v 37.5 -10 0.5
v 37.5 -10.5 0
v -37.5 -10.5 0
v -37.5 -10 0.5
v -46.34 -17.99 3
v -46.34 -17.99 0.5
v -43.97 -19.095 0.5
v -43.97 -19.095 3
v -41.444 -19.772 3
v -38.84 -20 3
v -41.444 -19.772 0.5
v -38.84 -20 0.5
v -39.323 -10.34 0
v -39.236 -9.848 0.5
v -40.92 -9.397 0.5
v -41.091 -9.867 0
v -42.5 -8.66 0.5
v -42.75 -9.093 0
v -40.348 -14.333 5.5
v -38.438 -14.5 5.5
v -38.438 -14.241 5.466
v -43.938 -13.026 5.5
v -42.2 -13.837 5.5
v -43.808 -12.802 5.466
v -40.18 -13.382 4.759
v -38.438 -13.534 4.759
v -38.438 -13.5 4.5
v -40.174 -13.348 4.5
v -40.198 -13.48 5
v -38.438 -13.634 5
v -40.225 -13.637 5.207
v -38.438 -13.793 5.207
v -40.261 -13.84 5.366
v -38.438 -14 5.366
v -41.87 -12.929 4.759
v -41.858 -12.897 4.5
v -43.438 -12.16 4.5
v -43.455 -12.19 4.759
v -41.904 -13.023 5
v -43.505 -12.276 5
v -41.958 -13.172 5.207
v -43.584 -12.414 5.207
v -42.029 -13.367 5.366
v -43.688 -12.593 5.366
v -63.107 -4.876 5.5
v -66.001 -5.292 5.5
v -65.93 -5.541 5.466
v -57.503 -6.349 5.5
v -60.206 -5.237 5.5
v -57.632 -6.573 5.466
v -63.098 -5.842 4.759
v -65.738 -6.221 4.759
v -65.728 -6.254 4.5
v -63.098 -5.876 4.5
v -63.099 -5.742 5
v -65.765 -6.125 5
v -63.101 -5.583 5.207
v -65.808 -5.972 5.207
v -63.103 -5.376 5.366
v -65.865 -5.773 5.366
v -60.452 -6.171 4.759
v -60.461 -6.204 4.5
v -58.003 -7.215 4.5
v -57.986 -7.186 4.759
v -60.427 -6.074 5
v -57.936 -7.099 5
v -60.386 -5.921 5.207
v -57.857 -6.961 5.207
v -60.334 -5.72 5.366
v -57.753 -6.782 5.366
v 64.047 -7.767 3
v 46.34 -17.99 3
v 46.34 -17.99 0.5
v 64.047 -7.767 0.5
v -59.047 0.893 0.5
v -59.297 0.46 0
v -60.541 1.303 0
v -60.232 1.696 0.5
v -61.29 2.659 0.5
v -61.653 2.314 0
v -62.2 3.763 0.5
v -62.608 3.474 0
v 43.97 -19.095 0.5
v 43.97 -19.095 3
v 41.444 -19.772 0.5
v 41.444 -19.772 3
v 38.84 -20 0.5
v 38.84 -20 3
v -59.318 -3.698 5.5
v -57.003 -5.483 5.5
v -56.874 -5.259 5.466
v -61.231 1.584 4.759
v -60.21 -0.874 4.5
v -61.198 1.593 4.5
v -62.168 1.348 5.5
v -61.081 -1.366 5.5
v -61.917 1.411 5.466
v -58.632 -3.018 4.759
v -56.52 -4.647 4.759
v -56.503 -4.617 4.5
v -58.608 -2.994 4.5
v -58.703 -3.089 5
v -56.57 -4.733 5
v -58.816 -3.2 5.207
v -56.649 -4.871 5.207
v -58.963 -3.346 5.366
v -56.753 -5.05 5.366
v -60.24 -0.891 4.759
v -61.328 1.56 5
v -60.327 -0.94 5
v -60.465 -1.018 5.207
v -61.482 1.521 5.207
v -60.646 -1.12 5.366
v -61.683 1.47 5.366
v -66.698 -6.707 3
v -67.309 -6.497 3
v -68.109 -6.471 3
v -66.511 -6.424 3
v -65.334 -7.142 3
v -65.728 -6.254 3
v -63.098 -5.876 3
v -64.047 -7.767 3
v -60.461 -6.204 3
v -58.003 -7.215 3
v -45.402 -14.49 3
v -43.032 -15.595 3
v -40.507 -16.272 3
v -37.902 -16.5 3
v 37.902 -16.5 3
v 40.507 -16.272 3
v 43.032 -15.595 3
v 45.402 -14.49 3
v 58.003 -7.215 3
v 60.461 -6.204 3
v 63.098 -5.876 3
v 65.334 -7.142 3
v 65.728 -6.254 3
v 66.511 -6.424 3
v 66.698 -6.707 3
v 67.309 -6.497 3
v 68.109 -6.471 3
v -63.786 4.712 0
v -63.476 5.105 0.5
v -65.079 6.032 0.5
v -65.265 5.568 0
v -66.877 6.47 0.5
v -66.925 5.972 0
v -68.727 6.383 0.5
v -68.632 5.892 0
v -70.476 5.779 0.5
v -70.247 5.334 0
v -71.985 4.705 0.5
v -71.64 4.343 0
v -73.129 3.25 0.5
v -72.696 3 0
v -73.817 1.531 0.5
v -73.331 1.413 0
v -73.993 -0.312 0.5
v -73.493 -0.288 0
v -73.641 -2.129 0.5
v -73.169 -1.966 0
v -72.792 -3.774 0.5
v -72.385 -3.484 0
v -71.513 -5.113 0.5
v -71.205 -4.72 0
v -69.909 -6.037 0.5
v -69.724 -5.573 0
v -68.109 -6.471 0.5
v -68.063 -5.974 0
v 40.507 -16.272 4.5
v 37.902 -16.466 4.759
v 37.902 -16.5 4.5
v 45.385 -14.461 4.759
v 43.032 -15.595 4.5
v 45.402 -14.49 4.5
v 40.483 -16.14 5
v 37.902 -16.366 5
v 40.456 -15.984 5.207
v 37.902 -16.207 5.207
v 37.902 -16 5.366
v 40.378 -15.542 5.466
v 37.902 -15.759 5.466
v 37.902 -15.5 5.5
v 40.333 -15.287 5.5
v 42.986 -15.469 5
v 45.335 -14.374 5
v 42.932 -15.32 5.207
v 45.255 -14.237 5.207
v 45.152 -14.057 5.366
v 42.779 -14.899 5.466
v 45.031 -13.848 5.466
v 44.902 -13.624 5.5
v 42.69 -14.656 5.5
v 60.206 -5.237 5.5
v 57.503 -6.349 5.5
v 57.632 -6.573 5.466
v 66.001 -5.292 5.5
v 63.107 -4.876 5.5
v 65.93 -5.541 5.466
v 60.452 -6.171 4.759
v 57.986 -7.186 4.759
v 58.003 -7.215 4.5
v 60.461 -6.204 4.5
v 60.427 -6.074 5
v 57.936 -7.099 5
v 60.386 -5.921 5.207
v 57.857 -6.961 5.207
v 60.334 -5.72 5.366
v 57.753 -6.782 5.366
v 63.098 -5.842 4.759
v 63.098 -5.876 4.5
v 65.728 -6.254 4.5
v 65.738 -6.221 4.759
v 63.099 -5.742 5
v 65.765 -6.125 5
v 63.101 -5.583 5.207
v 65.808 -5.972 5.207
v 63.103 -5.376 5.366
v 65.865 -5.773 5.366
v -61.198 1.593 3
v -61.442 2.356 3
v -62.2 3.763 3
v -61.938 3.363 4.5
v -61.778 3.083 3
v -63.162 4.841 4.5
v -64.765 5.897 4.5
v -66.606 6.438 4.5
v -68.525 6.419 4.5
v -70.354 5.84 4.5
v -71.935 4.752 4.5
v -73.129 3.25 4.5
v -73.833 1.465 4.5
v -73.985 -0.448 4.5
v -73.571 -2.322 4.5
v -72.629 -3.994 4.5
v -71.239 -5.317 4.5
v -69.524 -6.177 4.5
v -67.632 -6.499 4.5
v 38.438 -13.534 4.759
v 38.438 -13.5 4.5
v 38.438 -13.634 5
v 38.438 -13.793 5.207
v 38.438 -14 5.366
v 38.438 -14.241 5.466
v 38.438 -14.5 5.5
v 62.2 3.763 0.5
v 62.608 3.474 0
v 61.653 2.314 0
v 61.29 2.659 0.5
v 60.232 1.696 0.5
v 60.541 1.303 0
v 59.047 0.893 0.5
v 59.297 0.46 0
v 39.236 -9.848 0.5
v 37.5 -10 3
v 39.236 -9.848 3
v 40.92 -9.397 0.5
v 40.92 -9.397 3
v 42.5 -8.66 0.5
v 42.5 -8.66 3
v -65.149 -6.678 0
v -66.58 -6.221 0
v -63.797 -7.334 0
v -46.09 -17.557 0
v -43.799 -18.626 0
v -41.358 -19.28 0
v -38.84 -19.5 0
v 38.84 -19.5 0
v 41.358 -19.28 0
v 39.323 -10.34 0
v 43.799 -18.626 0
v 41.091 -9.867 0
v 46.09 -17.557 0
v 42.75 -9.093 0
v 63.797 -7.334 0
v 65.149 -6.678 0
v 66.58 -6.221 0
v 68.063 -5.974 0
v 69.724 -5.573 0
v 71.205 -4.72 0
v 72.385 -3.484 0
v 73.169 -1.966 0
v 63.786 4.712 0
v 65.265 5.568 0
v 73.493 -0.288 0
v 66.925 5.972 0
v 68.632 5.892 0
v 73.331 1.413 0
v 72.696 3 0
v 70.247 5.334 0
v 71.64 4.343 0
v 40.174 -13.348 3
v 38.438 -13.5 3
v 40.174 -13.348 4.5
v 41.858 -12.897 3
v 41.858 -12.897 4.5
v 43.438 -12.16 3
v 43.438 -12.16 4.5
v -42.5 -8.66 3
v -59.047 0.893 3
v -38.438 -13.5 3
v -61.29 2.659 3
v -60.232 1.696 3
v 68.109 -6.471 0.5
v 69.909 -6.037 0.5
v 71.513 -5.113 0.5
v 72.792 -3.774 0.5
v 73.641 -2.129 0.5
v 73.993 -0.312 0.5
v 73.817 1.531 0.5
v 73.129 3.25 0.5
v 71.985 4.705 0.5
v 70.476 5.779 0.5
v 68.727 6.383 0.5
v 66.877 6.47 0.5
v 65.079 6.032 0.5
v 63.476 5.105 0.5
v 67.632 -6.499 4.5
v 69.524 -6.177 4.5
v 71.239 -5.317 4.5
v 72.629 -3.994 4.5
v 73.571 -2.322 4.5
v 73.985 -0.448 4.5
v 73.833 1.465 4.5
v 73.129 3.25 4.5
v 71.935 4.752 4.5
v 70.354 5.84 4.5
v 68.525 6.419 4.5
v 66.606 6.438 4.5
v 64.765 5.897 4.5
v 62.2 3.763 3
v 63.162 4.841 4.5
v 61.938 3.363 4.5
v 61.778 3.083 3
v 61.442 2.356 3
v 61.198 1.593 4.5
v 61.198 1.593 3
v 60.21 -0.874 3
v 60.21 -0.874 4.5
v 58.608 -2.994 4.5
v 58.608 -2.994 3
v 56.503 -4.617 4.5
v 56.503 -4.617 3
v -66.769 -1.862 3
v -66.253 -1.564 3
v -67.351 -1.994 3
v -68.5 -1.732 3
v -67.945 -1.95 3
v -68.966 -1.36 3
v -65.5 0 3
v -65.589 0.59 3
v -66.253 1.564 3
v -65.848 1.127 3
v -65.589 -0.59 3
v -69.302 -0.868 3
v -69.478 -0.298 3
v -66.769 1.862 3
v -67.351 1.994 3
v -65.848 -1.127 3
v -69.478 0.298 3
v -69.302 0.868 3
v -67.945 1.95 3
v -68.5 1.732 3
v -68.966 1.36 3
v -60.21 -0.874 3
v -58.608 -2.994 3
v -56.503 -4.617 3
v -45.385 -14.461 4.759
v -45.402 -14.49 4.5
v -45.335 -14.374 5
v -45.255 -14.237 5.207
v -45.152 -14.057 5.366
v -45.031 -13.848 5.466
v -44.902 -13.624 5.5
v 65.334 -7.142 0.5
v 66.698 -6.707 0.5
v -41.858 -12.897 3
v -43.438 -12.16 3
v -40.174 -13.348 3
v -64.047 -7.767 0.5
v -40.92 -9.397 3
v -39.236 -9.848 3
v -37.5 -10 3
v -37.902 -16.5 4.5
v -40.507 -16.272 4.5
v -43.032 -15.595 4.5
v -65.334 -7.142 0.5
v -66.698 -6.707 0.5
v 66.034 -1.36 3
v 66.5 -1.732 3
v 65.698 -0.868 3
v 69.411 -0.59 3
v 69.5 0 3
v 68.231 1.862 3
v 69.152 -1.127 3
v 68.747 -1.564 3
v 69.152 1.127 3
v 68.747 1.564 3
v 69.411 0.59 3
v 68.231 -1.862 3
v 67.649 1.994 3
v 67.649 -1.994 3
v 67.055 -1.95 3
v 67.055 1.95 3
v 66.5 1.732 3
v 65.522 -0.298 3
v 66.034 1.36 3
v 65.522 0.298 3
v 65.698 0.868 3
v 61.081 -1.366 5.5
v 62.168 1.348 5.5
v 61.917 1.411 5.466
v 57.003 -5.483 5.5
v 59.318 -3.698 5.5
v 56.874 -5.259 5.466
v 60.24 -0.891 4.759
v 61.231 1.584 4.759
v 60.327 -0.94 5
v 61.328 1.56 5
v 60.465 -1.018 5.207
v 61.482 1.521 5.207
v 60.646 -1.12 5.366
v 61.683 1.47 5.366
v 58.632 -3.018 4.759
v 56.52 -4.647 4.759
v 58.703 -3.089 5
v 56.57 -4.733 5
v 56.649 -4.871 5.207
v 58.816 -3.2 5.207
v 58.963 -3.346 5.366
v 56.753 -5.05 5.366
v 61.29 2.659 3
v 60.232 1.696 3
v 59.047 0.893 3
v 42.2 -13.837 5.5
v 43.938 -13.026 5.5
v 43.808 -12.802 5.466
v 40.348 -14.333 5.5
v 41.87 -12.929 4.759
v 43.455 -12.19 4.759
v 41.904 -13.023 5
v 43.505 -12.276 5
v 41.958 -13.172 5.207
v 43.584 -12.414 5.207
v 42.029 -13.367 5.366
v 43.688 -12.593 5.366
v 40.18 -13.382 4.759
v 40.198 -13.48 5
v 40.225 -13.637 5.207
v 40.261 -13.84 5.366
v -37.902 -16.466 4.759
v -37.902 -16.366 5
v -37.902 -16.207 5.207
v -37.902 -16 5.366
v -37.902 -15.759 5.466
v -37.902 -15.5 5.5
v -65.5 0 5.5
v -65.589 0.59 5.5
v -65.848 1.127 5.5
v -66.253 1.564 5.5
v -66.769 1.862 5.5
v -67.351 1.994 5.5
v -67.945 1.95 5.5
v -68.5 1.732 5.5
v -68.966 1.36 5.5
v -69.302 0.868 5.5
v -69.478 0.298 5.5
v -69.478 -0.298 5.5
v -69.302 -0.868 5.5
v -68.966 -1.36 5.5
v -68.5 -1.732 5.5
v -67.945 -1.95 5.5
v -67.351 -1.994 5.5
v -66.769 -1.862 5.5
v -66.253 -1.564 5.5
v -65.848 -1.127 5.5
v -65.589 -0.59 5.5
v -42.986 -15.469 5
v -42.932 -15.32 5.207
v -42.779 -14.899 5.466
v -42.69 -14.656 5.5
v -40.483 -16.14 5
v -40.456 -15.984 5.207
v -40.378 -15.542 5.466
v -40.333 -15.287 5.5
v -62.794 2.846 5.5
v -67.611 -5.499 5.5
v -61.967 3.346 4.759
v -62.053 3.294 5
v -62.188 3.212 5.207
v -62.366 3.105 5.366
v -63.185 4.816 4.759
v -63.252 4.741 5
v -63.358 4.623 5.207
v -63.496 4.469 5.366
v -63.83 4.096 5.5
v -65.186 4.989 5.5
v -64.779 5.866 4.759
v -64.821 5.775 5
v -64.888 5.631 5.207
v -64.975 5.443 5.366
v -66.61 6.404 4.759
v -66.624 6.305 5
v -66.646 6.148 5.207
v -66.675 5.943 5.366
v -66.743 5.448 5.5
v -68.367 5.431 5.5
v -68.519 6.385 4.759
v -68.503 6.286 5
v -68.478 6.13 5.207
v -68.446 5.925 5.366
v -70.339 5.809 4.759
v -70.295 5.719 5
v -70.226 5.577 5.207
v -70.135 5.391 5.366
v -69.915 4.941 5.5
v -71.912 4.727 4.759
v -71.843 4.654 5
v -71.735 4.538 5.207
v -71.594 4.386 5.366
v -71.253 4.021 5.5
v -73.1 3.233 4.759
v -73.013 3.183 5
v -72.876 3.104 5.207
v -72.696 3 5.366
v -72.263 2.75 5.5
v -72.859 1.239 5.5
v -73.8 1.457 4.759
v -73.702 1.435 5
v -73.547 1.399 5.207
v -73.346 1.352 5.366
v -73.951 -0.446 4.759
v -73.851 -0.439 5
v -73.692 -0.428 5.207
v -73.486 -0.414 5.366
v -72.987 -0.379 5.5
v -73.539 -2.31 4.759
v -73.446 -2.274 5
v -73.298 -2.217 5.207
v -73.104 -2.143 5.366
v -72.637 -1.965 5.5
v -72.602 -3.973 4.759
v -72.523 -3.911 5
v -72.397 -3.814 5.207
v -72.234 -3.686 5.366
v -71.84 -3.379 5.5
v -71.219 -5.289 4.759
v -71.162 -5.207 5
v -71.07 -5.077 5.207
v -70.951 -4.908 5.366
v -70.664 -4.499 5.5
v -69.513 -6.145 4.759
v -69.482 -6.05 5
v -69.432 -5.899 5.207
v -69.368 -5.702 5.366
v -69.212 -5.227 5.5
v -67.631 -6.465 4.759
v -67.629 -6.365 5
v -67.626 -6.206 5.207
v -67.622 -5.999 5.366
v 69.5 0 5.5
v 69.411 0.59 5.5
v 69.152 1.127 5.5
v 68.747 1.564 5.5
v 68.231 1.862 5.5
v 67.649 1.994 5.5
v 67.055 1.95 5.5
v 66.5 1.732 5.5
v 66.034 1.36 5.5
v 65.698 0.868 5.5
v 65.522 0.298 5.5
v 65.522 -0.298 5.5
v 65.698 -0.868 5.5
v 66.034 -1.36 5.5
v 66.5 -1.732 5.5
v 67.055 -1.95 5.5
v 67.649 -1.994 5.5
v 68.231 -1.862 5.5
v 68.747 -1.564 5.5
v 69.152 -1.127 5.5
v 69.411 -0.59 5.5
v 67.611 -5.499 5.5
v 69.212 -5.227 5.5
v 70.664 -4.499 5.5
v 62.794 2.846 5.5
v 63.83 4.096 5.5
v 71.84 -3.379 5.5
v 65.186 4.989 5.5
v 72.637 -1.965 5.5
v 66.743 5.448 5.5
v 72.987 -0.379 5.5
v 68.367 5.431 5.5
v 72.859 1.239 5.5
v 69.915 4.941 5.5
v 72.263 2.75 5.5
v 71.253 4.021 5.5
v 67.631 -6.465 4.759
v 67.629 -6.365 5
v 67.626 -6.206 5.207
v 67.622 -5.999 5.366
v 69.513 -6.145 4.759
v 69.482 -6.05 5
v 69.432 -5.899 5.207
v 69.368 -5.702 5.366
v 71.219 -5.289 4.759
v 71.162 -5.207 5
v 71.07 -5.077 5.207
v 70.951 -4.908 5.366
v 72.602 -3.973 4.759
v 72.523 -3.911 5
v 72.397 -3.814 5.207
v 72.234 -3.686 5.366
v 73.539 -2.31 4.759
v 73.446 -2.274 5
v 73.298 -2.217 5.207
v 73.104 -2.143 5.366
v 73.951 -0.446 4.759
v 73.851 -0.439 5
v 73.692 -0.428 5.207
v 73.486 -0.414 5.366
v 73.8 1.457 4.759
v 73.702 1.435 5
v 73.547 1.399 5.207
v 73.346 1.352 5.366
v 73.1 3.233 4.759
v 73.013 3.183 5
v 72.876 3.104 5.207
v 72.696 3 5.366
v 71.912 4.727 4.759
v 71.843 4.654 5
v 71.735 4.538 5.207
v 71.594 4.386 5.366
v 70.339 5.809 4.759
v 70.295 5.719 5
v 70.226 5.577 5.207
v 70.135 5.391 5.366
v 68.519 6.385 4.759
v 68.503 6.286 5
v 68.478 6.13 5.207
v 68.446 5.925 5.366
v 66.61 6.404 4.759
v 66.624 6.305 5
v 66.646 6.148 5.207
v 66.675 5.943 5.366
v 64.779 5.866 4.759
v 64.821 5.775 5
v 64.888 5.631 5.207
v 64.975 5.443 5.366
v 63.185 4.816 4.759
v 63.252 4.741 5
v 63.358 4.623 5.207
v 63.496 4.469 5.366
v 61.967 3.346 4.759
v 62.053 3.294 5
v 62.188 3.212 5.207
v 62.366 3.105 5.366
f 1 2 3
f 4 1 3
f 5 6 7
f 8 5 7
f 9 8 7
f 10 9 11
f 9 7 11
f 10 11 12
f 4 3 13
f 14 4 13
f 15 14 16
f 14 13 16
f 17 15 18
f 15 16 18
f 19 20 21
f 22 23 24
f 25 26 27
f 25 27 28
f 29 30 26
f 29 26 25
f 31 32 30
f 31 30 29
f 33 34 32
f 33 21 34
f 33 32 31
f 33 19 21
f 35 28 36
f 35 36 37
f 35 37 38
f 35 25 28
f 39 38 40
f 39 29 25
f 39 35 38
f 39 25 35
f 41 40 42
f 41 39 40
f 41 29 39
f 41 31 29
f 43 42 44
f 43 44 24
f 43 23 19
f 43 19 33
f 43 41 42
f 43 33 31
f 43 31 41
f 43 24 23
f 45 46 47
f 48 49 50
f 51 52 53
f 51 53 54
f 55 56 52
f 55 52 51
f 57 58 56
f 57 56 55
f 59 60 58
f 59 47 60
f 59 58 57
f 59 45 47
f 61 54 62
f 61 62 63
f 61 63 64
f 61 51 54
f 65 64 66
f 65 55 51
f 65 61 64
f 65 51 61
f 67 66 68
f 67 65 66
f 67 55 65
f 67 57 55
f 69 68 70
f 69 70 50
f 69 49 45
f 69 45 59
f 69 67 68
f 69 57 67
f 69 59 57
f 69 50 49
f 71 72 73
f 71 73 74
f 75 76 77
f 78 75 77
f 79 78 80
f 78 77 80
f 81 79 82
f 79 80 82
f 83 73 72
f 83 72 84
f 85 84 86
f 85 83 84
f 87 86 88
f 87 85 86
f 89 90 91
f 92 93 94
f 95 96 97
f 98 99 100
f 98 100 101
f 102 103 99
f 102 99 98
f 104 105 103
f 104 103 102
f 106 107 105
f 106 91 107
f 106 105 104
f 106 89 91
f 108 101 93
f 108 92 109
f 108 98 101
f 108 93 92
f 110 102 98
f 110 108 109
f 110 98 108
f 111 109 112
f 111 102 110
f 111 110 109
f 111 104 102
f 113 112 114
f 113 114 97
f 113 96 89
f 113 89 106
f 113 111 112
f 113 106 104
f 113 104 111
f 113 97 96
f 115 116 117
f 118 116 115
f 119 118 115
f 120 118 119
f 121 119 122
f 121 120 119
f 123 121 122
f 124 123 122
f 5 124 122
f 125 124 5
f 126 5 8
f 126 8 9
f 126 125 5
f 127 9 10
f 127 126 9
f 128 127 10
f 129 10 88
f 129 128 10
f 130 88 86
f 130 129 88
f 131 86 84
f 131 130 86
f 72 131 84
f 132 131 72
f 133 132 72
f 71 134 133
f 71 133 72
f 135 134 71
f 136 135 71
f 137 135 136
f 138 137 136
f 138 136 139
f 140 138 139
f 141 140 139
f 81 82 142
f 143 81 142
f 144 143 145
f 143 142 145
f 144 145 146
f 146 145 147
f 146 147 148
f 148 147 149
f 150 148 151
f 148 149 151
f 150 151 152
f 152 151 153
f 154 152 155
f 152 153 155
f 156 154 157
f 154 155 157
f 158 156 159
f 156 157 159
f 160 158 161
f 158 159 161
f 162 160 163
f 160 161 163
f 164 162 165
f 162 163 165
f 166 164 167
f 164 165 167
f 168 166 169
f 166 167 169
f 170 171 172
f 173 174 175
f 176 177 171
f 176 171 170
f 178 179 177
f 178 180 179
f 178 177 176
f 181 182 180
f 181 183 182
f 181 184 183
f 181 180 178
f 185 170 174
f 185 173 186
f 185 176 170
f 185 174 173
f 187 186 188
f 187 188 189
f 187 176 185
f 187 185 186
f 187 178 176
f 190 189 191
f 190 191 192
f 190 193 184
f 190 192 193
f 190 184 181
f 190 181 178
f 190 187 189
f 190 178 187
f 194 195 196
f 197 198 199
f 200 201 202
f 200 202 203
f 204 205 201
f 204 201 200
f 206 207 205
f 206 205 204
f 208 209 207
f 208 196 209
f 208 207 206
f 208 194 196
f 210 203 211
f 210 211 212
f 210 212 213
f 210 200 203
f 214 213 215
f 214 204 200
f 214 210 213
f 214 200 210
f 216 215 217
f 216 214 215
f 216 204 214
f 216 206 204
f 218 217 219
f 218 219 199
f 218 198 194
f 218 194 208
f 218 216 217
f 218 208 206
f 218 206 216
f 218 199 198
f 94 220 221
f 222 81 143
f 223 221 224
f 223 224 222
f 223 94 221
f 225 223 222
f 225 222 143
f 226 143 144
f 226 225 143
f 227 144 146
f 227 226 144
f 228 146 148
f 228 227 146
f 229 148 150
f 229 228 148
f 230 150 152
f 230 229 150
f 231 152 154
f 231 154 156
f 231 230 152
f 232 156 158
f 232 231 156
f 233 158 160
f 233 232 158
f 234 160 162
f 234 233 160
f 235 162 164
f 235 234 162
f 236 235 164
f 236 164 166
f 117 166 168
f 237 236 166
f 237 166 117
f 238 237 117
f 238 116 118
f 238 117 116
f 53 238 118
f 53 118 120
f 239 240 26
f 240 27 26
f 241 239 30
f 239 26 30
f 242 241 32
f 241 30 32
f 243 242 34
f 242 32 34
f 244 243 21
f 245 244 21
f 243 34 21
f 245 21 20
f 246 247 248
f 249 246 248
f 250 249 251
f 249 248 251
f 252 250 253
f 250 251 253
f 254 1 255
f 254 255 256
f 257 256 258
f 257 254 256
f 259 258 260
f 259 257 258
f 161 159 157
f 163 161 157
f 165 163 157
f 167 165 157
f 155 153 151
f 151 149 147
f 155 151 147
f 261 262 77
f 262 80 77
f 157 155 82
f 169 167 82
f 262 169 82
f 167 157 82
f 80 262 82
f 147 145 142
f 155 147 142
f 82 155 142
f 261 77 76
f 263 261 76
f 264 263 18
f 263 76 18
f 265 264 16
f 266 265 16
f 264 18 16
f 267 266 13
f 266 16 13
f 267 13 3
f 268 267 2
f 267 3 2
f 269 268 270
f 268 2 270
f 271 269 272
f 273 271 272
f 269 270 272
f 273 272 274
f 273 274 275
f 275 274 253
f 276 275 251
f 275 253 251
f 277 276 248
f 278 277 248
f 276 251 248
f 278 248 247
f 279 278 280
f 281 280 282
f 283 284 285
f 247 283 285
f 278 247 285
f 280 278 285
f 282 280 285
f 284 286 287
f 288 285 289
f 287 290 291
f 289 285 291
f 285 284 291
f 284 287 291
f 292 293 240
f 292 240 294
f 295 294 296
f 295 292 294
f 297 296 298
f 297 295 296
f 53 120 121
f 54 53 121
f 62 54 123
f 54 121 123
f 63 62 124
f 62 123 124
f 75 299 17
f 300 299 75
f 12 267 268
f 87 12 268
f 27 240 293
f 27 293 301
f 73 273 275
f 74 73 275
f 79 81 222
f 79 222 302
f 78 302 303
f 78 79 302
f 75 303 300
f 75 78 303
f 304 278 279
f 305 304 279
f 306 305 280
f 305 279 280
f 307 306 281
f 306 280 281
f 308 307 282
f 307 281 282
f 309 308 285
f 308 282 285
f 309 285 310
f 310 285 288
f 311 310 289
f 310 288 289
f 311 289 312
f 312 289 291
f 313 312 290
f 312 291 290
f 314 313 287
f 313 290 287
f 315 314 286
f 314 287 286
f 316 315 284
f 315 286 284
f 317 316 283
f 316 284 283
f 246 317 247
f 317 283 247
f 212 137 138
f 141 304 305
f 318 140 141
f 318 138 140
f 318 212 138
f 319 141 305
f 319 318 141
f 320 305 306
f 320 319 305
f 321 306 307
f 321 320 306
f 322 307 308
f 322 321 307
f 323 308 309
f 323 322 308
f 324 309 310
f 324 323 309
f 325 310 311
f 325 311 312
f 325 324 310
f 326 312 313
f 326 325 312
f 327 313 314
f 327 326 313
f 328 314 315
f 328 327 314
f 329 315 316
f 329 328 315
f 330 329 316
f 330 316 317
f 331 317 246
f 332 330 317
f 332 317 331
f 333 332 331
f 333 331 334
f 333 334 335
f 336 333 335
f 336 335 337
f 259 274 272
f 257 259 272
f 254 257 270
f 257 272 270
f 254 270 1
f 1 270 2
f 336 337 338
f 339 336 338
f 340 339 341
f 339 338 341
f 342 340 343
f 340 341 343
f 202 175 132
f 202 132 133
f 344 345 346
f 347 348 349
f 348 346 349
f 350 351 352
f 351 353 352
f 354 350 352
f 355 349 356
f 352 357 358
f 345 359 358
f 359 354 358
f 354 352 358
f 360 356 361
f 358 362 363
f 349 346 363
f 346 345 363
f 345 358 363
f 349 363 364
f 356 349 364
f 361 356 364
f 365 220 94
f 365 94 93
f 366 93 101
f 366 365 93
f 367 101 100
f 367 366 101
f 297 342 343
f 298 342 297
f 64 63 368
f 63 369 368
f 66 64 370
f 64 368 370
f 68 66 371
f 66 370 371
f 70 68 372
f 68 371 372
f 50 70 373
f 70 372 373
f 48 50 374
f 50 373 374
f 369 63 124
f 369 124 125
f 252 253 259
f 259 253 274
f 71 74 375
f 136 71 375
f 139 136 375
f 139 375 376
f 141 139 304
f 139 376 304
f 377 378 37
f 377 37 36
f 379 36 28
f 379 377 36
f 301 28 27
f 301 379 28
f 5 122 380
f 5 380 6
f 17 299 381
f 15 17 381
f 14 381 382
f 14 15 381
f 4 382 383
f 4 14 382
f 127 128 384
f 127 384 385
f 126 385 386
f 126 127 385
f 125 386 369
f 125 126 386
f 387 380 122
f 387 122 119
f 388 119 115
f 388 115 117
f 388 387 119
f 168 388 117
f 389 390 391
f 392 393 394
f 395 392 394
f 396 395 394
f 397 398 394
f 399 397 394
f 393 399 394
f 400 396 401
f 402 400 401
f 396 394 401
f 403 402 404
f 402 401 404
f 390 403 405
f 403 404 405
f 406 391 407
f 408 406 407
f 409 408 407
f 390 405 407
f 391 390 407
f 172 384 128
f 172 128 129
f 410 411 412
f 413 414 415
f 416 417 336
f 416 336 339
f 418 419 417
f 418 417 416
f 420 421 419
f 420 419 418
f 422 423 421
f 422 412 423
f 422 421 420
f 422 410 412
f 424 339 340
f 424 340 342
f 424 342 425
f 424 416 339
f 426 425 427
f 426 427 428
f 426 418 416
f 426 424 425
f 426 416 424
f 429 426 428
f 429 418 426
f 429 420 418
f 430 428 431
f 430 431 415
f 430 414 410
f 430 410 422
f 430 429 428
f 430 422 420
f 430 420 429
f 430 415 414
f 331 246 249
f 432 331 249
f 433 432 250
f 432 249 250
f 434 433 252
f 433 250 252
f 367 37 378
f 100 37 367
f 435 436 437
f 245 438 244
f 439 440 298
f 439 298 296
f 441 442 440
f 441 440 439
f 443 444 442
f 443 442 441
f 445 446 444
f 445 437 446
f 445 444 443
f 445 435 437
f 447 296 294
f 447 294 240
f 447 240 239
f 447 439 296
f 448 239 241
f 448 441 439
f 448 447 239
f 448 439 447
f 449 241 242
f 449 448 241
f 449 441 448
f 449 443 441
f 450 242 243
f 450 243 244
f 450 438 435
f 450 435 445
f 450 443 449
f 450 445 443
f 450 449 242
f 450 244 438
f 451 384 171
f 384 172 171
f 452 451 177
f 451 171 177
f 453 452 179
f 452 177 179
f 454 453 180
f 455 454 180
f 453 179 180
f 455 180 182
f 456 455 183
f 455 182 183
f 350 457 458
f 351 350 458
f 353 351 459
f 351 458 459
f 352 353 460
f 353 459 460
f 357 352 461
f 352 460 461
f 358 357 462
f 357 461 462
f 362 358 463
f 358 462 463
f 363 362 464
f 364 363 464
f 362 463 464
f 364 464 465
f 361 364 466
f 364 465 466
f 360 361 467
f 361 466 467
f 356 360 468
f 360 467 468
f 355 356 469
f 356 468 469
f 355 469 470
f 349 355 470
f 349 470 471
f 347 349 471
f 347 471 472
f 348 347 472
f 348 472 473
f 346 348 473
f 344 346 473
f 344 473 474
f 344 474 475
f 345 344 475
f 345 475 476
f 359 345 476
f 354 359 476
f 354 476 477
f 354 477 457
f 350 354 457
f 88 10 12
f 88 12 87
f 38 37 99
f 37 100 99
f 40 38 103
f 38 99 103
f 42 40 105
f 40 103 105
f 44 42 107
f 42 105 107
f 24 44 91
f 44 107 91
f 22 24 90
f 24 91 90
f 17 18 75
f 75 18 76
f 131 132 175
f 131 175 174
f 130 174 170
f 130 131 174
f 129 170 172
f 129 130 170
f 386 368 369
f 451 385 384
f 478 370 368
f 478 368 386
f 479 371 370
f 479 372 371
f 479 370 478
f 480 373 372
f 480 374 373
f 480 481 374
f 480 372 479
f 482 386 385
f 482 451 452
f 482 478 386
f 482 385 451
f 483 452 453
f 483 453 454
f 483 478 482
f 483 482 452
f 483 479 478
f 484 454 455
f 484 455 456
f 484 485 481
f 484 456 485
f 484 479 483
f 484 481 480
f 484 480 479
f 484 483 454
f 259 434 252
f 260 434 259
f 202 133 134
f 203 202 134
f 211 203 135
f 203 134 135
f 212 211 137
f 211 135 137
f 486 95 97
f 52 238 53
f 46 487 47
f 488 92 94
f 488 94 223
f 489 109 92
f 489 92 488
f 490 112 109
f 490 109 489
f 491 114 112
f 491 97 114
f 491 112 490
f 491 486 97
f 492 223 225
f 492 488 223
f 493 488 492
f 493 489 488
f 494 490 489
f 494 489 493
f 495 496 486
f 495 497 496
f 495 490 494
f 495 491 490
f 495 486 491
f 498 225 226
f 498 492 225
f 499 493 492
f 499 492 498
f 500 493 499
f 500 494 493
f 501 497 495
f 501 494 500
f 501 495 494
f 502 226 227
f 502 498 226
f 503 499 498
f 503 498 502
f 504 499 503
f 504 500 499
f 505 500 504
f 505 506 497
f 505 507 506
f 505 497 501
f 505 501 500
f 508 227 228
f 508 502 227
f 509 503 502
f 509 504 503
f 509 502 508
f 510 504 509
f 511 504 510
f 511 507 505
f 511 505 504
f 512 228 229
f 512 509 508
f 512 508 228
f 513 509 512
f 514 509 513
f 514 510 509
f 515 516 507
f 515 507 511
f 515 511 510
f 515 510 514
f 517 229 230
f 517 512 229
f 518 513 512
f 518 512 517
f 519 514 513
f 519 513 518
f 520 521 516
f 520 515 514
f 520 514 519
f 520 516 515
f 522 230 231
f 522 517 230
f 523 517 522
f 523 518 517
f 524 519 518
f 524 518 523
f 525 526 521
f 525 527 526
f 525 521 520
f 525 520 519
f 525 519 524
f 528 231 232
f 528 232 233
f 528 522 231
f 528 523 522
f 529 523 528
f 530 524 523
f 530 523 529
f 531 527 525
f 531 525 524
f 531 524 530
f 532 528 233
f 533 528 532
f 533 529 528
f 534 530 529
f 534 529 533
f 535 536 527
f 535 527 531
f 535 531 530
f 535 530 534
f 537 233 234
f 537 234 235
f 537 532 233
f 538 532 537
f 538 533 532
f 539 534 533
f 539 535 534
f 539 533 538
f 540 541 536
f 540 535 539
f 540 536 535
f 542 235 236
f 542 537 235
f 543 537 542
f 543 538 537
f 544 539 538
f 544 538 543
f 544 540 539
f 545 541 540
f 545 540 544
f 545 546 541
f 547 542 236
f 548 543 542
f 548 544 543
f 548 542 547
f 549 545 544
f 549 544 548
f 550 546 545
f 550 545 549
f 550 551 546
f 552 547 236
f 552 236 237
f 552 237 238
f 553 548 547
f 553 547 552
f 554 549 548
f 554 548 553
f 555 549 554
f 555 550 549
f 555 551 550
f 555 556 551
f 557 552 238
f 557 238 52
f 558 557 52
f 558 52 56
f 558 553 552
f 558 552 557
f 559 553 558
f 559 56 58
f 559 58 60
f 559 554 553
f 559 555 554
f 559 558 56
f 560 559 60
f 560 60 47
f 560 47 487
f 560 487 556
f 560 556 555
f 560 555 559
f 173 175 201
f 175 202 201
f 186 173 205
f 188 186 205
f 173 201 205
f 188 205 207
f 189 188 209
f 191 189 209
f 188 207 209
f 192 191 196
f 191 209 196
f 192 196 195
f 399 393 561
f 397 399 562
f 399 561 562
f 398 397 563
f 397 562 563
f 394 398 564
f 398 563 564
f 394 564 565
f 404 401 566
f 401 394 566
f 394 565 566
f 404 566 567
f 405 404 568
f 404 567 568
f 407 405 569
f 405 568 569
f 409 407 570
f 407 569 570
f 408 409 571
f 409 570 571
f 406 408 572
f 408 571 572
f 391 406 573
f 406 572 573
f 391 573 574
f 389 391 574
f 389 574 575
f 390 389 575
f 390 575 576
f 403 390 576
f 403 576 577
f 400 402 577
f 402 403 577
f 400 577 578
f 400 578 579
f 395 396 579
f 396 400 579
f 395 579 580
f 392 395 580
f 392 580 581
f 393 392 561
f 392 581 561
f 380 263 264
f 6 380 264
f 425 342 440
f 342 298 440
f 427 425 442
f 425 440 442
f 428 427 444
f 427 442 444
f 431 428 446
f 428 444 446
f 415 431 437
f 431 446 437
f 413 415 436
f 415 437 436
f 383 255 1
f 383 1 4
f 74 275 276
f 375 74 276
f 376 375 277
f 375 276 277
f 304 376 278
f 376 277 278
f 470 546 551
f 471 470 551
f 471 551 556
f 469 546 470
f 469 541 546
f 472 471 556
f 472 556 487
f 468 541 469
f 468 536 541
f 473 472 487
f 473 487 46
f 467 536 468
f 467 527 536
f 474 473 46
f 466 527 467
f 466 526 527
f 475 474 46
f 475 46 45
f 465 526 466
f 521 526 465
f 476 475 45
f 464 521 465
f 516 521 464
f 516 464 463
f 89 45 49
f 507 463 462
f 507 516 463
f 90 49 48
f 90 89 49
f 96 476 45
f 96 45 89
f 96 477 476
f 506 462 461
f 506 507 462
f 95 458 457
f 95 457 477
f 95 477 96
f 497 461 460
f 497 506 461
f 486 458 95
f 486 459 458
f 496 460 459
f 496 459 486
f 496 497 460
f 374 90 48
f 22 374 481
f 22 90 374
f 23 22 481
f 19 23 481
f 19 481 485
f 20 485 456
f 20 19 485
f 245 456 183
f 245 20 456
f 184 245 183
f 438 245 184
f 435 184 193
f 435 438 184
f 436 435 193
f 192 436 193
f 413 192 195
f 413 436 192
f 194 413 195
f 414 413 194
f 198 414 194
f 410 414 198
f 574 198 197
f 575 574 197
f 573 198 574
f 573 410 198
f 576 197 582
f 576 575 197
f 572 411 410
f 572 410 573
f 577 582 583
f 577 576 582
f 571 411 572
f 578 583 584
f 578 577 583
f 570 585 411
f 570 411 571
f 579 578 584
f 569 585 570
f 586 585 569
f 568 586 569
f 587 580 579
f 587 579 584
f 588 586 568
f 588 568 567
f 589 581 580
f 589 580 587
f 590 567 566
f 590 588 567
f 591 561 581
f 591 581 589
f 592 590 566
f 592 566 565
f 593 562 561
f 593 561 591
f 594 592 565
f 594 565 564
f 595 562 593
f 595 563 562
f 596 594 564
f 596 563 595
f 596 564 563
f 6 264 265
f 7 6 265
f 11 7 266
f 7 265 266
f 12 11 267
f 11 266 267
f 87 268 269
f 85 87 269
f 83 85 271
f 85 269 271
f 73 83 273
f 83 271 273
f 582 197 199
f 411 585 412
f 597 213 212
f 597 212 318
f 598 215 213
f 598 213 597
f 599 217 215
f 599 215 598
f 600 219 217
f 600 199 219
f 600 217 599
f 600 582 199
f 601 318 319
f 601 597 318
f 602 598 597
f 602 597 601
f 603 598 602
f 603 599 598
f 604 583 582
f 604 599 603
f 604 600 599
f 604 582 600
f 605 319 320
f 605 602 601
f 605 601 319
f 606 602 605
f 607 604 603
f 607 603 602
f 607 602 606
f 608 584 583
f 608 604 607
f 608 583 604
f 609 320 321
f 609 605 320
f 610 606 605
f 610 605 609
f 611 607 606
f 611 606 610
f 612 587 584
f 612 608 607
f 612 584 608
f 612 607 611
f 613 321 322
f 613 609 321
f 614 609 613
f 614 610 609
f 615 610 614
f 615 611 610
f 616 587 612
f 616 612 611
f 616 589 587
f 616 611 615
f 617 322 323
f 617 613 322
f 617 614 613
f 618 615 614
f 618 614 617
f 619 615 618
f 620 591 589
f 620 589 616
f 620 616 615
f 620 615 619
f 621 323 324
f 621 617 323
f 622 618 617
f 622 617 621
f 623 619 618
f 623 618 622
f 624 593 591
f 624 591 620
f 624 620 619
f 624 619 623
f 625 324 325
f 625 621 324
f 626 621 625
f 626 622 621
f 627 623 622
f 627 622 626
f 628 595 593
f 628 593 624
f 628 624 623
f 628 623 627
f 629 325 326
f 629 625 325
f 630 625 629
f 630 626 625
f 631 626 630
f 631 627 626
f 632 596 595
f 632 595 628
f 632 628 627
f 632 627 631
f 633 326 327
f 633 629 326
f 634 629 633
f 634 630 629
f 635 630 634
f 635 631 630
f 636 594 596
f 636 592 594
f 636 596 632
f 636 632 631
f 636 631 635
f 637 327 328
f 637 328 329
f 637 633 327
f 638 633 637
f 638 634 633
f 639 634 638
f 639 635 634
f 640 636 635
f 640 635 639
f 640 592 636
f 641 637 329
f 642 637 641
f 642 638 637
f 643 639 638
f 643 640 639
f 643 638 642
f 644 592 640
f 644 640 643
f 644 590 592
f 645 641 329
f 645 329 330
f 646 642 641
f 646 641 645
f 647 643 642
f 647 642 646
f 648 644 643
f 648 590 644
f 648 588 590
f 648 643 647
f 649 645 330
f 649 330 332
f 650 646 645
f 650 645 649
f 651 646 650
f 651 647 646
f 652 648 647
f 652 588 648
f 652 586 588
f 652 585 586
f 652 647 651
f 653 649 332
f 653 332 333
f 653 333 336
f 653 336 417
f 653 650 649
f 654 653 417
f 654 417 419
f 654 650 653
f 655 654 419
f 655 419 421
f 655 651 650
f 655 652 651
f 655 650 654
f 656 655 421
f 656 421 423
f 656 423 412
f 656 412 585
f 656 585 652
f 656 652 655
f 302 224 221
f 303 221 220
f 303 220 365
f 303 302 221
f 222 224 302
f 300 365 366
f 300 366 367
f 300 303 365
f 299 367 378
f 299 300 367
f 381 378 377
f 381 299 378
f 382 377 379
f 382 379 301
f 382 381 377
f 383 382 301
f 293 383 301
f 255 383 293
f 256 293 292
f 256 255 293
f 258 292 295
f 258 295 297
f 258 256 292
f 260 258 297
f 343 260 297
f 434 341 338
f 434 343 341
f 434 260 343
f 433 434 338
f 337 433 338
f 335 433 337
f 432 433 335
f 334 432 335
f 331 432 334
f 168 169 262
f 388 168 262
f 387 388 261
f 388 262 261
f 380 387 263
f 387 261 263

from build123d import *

# Parameters (mm, degrees)
EXTRUDE_1_DEPTH       = 2.500000000014097
EXTRUDE_2_DEPTH       = 2.9999999999999996
HOLE_WIZARD_4_0_4_1_D = 4
FILLET_1_R            = 10
FILLET_2_R            = 15.000000000000004
CHAMFER_1_SIZE        = 0.4999999999999998
FILLET_4_R            = 1
EXTRUDE_START         = -3
SKETCH_5_R            = 1.999999999999988
EXTRUDE_3_DEPTH       = 3


with BuildPart() as part:
    # 草图1 → 凸台-拉伸1 (new body)
    with BuildSketch(Plane.XY.offset(5.5)):
        with BuildLine():
            Line((-62.772774424948345, -4.461315765845048), (-41.9211616751135, -16.50000000000001))
            Line((-41.9211616751135, -16.50000000000001), (41.92116167511347, -16.5))
            Line((41.92116167511347, -16.5), (62.77277442494833, -4.461315765845017))
            ThreePointArc((62.77277442494833, -4.461315765845017), (73.12916512459886, 3.249999999999975), (61.27277442494834, -1.863239554491695))
            Line((61.27277442494834, -1.863239554491695), (41.117314097820056, -13.50000000000001))
            Line((41.117314097820056, -13.50000000000001), (-41.117314097820156, -13.500000000000009))
            Line((-41.117314097820156, -13.500000000000009), (-61.272774424948345, -1.863239554491729))
            ThreePointArc((-61.272774424948345, -1.863239554491729), (-73.12916512459884, 3.2500000000000075), (-62.772774424948345, -4.461315765845048))
        make_face()
    extrude(amount=-EXTRUDE_1_DEPTH)

    # 草图2 → 凸台-拉伸2 (add)
    with BuildSketch(Plane(origin=(0, 0, 2.9999999999859024), x_dir=(-1, 0, 0), z_dir=(0, 0, -1))):
        with BuildLine():
            Line((66.40312635751548, -6.406782984651714), (42.858983848622465, -20))
            Line((42.858983848622465, -20), (-42.85898384862241, -19.999999999999996))
            Line((-42.85898384862241, -19.999999999999996), (-66.40312635751543, -6.406782984651706))
            ThreePointArc((-66.40312635751543, -6.406782984651706), (-73.12916512459887, 3.24999999999996), (-61.40312635751548, 2.253471053192728))
            Line((-61.40312635751548, 2.253471053192728), (-40.17949192431118, -9.999999999999998))
            Line((-40.17949192431118, -9.999999999999998), (40.17949192431122, -10.000000000000009))
            Line((40.17949192431122, -10.000000000000009), (61.40312635751546, 2.2534710531926625))
            ThreePointArc((61.40312635751546, 2.2534710531926625), (73.12916512459884, 3.250000000000009), (66.40312635751548, -6.406782984651714))
        make_face()
    extrude(amount=EXTRUDE_2_DEPTH)

    # Ø4.0 (4) 直径孔1 (through all)
    with Locations(Plane(origin=(0, 0, 0), x_dir=(-1, 0, 0), z_dir=(0, 0, -1))):
        with Locations((67.5, 0), (-67.5, 0)):
            Hole(HOLE_WIZARD_4_0_4_1_D / 2)

    # 圆角1
    fillet_1_edges = [part.edges().sort_by_distance(p)[0] for p in [
        (-61.27277442494835, -1.8632395544917282, 4.249999999992951),
        (-41.117314097820156, -13.500000000000009, 4.249999999992951),
        (41.117314097820056, -13.50000000000001, 4.249999999992951),
        (61.27277442494834, -1.863239554491694, 4.249999999992951),
        (62.77277442494834, -4.461315765845014, 4.249999999992951),
        (-62.772774424948345, -4.461315765845047, 4.249999999992951),
        (-66.40312635751548, -6.406782984651716, 1.4999999999859026),
        (-61.40312635751547, 2.2534710531926603, 1.4999999999859026),
        (-40.17949192431122, -10.000000000000009, 1.4999999999859026),
        (40.17949192431118, -9.999999999999998, 1.4999999999859026),
        (61.403126357515475, 2.2534710531927282, 1.4999999999859026),
        (66.40312635751543, -6.406782984651702, 1.4999999999859026),
    ]]
    fillet(fillet_1_edges, radius=FILLET_1_R)

    # 圆角2
    fillet_2_edges = [part.edges().sort_by_distance(p)[0] for p in [
        (41.92116167511347, -16.5, 4.249999999992951),
        (-41.9211616751135, -16.50000000000001, 4.249999999992951),
        (42.85898384862241, -19.999999999999996, 1.4999999999859026),
        (-42.858983848622465, -20, 1.4999999999859026),
    ]]
    fillet(fillet_2_edges, radius=FILLET_2_R)

    # 倒角1
    chamfer_1_edges = [part.edges().sort_by_distance(p)[0] for p in [
        (-55.193402756130126, -12.878719923452845, -1.409717e-11),
        (-1.421e-14, -19.999999999999996, -1.409717e-11),
        (42.722031638693394, -19.488887394336025, -1.409717e-11),
        (-42.72203163869342, -19.48888739433603, -1.409717e-11),
        (50.77352977505234, -3.883529395069502, -1.409717e-11),
        (-2.132e-14, -10.000000000000004, -1.409717e-11),
        (-50.77352977505235, -3.8835293950695364, -1.409717e-11),
        (-73.12916512459887, 3.2499999999999756, -1.409717e-11),
        (55.193402756130126, -12.878719923452813, -1.409717e-11),
        (73.12916512459886, 3.2499999999999876, -1.409717e-11),
        (40.088190451025156, -9.659258262890683, -1.409717e-11),
        (-60.778474019386664, 2.158311745061262, -1.409717e-11),
        (66.00838981020269, -6.900168123938897, -1.409717e-11),
        (-40.08819045102521, -9.65925826289069, -1.409717e-11),
        (60.778474019386664, 2.1583117450613107, -1.409717e-11),
        (-66.00838981020267, -6.900168123938933, -1.409717e-11),
    ]]
    chamfer(chamfer_1_edges, length=CHAMFER_1_SIZE)

    # 圆角4
    fillet_4_edges = [part.edges().sort_by_distance(p)[0] for p in [
        (-1.421e-14, -16.500000000000004, 5.5),
        (51.70248651134352, -10.85274947277141, 5.5),
        (-41.784209465184475, -15.988887394336034, 5.5),
        (41.78420946518445, -15.988887394336027, 5.5),
        (-73.12916512459887, 3.2499999999999796, 5.5),
        (73.12916512459886, 3.250000000000003, 5.5),
        (49.970435703774626, -8.388647857633657, 5.5),
        (-4.974e-14, -13.50000000000001, 5.5),
        (-49.970435703774676, -8.388647857633675, 5.5),
        (-51.70248651134354, -10.852749472771439, 5.5),
        (59.47971041107501, -1.9877806313493807, 5.5),
        (-41.02601262453415, -13.159258262890692, 5.5),
        (-59.479710411075004, -1.9877806313494268, 5.5),
        (-61.76838668163823, -5.951884214042208, 5.5),
        (61.76838668163825, -5.951884214042176, 5.5),
        (41.02601262453404, -13.159258262890695, 5.5),
    ]]
    fillet(fillet_4_edges, radius=FILLET_4_R)

    # 草图5 → 凸台-拉伸3 (add)
    with BuildSketch(Plane(origin=(0, 0, 0), x_dir=(-1, 0, 0), z_dir=(0, 0, -1)).offset(EXTRUDE_START)):
        with Locations((67.5, 0)):
            Circle(SKETCH_5_R)
        with Locations((-67.5, 0)):
            Circle(SKETCH_5_R)
    extrude(amount=EXTRUDE_3_DEPTH)


solid = part.part
